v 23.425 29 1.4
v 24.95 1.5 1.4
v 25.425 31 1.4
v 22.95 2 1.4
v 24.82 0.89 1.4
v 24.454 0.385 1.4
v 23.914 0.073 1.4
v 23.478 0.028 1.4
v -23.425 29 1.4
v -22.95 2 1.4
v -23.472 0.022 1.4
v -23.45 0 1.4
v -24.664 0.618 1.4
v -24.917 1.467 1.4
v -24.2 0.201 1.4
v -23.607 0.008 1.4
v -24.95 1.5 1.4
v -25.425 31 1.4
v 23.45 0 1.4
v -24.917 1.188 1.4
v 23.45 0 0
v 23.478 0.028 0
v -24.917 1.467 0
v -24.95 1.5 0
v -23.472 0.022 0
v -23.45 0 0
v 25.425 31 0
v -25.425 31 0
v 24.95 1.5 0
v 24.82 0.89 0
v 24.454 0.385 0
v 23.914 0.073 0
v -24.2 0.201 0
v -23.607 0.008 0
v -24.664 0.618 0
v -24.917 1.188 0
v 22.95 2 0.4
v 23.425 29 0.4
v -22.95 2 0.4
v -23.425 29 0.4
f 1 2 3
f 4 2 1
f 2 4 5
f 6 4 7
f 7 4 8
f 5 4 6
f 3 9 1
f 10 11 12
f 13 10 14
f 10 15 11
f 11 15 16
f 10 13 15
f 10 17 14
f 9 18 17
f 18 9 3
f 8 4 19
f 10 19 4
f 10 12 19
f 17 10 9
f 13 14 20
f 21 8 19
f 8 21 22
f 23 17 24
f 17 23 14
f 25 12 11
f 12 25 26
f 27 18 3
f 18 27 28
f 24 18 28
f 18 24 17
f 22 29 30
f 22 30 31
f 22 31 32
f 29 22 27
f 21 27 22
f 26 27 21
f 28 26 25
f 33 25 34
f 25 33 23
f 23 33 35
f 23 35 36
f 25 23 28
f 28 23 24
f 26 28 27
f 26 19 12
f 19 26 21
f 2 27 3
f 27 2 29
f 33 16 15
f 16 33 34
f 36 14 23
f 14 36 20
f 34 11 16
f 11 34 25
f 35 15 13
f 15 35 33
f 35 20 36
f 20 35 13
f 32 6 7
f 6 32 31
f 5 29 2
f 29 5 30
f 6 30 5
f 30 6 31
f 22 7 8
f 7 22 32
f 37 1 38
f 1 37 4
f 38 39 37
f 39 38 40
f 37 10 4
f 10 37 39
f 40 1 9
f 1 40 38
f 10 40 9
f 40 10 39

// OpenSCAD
$fn = 15;

RADIUS = 1.5;

LENGTH_TOP = 50.85;
LENGTH_BOTTOM = 49.9;
HEIGHT = 31;
THICKNESS = 0.4;
BORDER_WIDTH = 2;
BORDER_THICKNESS = 1.4;

module separator() {

    difference() {
        union() {
            // Create exterior
            linear_extrude(height = BORDER_THICKNESS) {
                polygon([
                    [- LENGTH_TOP / 2, HEIGHT], [LENGTH_TOP / 2, HEIGHT],
                    [LENGTH_BOTTOM / 2, RADIUS], [LENGTH_BOTTOM  / 2 - RADIUS, 0],
                    [- LENGTH_BOTTOM / 2 + RADIUS, 0], [- LENGTH_BOTTOM / 2, RADIUS]
                ]);
            }

            // Rounded corner
            translate([- LENGTH_BOTTOM / 2 + RADIUS, RADIUS, 0]) {
                cylinder(r = RADIUS, h = BORDER_THICKNESS);
            }

            translate([LENGTH_BOTTOM / 2 - RADIUS, RADIUS, 0]) {
                cylinder(r = RADIUS, h = BORDER_THICKNESS);
            }
        }

        // Create border
        translate([0, 0, THICKNESS]) {
            linear_extrude(height = BORDER_THICKNESS) {
                polygon([
                    [- LENGTH_TOP / 2 + BORDER_WIDTH, HEIGHT - BORDER_WIDTH],
                    [LENGTH_TOP / 2 - BORDER_WIDTH, HEIGHT - BORDER_WIDTH],
                    [LENGTH_BOTTOM / 2 - BORDER_WIDTH, BORDER_WIDTH],
                    [- LENGTH_BOTTOM / 2 + BORDER_WIDTH, BORDER_WIDTH]
                ]);
            }
        }
    }
}

separator();
